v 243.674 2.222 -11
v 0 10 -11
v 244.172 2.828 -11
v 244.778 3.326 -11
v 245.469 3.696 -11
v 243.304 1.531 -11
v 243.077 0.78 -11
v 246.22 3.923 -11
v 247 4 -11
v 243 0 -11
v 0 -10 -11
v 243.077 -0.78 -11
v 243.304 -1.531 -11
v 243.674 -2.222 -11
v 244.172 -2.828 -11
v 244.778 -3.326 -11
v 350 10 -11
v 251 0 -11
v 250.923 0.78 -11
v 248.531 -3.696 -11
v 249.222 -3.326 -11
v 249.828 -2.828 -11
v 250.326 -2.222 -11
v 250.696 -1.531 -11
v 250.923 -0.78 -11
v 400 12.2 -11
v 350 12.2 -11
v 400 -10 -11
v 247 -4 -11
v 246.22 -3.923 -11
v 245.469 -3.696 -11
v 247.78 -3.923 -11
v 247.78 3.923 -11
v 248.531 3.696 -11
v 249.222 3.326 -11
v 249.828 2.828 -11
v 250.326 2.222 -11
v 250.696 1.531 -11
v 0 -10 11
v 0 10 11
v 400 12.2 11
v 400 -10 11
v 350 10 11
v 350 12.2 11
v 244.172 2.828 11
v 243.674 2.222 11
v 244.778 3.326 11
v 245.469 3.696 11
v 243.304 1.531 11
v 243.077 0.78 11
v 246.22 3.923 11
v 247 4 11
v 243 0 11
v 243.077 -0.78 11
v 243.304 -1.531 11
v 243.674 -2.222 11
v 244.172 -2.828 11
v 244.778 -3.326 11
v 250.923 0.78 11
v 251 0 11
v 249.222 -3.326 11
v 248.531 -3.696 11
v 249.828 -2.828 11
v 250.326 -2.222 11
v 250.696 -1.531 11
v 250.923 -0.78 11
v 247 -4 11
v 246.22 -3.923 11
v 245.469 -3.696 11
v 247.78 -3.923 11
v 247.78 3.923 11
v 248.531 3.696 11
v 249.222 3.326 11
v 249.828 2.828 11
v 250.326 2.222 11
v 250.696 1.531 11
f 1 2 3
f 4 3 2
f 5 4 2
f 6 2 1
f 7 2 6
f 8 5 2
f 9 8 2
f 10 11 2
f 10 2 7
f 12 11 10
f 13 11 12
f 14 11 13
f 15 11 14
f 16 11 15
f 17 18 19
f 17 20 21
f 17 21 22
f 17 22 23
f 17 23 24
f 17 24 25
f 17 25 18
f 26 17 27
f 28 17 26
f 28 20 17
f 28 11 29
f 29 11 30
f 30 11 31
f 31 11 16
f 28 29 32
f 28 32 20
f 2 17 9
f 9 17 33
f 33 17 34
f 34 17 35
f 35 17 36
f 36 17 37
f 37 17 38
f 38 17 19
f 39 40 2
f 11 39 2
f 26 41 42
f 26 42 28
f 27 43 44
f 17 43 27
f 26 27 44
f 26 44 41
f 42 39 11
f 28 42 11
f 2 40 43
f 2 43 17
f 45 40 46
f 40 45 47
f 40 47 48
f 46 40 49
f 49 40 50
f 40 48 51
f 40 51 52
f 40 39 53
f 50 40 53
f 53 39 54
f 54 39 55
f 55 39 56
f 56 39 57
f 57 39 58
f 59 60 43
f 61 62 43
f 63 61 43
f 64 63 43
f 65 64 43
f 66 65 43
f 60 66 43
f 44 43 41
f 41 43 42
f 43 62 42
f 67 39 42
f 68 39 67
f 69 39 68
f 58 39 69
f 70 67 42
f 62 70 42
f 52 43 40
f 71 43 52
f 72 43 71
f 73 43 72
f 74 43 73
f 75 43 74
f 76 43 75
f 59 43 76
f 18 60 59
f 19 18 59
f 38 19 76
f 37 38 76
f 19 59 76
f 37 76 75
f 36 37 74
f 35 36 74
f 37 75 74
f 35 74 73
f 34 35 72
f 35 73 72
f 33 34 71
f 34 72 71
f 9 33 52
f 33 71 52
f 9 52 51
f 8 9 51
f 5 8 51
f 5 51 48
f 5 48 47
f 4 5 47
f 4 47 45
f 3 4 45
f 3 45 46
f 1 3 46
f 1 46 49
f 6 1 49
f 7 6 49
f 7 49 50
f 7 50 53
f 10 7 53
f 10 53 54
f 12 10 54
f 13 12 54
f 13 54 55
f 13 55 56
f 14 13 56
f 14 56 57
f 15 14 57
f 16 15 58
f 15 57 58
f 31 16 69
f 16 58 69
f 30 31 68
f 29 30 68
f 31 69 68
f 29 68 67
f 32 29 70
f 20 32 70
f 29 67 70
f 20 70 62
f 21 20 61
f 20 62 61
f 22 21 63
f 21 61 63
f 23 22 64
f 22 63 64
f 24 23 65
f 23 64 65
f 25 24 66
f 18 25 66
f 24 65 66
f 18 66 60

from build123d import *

# Parameters (mm, degrees)
SKETCH1_W           = 22
SKETCH1_H           = 20
BOSS_EXTRUDE1_DEPTH = 400
SKETCH2_R           = 4
CUT_EXTRUDE1_DEPTH  = 23
SKETCH3_W           = 50
SKETCH3_H           = 22
BOSS_EXTRUDE2_DEPTH = 2.2


with BuildPart() as part:
    # Sketch1 → Boss-Extrude1 (new body)
    with BuildSketch(Plane(origin=(0, 0, 0), x_dir=(0, 0, -1), z_dir=(1, 0, 0))):
        Rectangle(SKETCH1_W, SKETCH1_H)
    extrude(amount=BOSS_EXTRUDE1_DEPTH)

    # Sketch2 → Cut-Extrude1 (cut, through all)
    with BuildSketch(Plane.XY.offset(11)):
        with Locations((247, 0)):
            Circle(SKETCH2_R)
    extrude(amount=-CUT_EXTRUDE1_DEPTH, mode=Mode.SUBTRACT)

    # Sketch3 → Boss-Extrude2 (add)
    with BuildSketch(Plane(origin=(0, 10, 0), x_dir=(1, 0, 0), z_dir=(0, 1, 0))):
        with Locations((375, 0)):
            Rectangle(SKETCH3_W, SKETCH3_H)
    extrude(amount=BOSS_EXTRUDE2_DEPTH)


solid = part.part
